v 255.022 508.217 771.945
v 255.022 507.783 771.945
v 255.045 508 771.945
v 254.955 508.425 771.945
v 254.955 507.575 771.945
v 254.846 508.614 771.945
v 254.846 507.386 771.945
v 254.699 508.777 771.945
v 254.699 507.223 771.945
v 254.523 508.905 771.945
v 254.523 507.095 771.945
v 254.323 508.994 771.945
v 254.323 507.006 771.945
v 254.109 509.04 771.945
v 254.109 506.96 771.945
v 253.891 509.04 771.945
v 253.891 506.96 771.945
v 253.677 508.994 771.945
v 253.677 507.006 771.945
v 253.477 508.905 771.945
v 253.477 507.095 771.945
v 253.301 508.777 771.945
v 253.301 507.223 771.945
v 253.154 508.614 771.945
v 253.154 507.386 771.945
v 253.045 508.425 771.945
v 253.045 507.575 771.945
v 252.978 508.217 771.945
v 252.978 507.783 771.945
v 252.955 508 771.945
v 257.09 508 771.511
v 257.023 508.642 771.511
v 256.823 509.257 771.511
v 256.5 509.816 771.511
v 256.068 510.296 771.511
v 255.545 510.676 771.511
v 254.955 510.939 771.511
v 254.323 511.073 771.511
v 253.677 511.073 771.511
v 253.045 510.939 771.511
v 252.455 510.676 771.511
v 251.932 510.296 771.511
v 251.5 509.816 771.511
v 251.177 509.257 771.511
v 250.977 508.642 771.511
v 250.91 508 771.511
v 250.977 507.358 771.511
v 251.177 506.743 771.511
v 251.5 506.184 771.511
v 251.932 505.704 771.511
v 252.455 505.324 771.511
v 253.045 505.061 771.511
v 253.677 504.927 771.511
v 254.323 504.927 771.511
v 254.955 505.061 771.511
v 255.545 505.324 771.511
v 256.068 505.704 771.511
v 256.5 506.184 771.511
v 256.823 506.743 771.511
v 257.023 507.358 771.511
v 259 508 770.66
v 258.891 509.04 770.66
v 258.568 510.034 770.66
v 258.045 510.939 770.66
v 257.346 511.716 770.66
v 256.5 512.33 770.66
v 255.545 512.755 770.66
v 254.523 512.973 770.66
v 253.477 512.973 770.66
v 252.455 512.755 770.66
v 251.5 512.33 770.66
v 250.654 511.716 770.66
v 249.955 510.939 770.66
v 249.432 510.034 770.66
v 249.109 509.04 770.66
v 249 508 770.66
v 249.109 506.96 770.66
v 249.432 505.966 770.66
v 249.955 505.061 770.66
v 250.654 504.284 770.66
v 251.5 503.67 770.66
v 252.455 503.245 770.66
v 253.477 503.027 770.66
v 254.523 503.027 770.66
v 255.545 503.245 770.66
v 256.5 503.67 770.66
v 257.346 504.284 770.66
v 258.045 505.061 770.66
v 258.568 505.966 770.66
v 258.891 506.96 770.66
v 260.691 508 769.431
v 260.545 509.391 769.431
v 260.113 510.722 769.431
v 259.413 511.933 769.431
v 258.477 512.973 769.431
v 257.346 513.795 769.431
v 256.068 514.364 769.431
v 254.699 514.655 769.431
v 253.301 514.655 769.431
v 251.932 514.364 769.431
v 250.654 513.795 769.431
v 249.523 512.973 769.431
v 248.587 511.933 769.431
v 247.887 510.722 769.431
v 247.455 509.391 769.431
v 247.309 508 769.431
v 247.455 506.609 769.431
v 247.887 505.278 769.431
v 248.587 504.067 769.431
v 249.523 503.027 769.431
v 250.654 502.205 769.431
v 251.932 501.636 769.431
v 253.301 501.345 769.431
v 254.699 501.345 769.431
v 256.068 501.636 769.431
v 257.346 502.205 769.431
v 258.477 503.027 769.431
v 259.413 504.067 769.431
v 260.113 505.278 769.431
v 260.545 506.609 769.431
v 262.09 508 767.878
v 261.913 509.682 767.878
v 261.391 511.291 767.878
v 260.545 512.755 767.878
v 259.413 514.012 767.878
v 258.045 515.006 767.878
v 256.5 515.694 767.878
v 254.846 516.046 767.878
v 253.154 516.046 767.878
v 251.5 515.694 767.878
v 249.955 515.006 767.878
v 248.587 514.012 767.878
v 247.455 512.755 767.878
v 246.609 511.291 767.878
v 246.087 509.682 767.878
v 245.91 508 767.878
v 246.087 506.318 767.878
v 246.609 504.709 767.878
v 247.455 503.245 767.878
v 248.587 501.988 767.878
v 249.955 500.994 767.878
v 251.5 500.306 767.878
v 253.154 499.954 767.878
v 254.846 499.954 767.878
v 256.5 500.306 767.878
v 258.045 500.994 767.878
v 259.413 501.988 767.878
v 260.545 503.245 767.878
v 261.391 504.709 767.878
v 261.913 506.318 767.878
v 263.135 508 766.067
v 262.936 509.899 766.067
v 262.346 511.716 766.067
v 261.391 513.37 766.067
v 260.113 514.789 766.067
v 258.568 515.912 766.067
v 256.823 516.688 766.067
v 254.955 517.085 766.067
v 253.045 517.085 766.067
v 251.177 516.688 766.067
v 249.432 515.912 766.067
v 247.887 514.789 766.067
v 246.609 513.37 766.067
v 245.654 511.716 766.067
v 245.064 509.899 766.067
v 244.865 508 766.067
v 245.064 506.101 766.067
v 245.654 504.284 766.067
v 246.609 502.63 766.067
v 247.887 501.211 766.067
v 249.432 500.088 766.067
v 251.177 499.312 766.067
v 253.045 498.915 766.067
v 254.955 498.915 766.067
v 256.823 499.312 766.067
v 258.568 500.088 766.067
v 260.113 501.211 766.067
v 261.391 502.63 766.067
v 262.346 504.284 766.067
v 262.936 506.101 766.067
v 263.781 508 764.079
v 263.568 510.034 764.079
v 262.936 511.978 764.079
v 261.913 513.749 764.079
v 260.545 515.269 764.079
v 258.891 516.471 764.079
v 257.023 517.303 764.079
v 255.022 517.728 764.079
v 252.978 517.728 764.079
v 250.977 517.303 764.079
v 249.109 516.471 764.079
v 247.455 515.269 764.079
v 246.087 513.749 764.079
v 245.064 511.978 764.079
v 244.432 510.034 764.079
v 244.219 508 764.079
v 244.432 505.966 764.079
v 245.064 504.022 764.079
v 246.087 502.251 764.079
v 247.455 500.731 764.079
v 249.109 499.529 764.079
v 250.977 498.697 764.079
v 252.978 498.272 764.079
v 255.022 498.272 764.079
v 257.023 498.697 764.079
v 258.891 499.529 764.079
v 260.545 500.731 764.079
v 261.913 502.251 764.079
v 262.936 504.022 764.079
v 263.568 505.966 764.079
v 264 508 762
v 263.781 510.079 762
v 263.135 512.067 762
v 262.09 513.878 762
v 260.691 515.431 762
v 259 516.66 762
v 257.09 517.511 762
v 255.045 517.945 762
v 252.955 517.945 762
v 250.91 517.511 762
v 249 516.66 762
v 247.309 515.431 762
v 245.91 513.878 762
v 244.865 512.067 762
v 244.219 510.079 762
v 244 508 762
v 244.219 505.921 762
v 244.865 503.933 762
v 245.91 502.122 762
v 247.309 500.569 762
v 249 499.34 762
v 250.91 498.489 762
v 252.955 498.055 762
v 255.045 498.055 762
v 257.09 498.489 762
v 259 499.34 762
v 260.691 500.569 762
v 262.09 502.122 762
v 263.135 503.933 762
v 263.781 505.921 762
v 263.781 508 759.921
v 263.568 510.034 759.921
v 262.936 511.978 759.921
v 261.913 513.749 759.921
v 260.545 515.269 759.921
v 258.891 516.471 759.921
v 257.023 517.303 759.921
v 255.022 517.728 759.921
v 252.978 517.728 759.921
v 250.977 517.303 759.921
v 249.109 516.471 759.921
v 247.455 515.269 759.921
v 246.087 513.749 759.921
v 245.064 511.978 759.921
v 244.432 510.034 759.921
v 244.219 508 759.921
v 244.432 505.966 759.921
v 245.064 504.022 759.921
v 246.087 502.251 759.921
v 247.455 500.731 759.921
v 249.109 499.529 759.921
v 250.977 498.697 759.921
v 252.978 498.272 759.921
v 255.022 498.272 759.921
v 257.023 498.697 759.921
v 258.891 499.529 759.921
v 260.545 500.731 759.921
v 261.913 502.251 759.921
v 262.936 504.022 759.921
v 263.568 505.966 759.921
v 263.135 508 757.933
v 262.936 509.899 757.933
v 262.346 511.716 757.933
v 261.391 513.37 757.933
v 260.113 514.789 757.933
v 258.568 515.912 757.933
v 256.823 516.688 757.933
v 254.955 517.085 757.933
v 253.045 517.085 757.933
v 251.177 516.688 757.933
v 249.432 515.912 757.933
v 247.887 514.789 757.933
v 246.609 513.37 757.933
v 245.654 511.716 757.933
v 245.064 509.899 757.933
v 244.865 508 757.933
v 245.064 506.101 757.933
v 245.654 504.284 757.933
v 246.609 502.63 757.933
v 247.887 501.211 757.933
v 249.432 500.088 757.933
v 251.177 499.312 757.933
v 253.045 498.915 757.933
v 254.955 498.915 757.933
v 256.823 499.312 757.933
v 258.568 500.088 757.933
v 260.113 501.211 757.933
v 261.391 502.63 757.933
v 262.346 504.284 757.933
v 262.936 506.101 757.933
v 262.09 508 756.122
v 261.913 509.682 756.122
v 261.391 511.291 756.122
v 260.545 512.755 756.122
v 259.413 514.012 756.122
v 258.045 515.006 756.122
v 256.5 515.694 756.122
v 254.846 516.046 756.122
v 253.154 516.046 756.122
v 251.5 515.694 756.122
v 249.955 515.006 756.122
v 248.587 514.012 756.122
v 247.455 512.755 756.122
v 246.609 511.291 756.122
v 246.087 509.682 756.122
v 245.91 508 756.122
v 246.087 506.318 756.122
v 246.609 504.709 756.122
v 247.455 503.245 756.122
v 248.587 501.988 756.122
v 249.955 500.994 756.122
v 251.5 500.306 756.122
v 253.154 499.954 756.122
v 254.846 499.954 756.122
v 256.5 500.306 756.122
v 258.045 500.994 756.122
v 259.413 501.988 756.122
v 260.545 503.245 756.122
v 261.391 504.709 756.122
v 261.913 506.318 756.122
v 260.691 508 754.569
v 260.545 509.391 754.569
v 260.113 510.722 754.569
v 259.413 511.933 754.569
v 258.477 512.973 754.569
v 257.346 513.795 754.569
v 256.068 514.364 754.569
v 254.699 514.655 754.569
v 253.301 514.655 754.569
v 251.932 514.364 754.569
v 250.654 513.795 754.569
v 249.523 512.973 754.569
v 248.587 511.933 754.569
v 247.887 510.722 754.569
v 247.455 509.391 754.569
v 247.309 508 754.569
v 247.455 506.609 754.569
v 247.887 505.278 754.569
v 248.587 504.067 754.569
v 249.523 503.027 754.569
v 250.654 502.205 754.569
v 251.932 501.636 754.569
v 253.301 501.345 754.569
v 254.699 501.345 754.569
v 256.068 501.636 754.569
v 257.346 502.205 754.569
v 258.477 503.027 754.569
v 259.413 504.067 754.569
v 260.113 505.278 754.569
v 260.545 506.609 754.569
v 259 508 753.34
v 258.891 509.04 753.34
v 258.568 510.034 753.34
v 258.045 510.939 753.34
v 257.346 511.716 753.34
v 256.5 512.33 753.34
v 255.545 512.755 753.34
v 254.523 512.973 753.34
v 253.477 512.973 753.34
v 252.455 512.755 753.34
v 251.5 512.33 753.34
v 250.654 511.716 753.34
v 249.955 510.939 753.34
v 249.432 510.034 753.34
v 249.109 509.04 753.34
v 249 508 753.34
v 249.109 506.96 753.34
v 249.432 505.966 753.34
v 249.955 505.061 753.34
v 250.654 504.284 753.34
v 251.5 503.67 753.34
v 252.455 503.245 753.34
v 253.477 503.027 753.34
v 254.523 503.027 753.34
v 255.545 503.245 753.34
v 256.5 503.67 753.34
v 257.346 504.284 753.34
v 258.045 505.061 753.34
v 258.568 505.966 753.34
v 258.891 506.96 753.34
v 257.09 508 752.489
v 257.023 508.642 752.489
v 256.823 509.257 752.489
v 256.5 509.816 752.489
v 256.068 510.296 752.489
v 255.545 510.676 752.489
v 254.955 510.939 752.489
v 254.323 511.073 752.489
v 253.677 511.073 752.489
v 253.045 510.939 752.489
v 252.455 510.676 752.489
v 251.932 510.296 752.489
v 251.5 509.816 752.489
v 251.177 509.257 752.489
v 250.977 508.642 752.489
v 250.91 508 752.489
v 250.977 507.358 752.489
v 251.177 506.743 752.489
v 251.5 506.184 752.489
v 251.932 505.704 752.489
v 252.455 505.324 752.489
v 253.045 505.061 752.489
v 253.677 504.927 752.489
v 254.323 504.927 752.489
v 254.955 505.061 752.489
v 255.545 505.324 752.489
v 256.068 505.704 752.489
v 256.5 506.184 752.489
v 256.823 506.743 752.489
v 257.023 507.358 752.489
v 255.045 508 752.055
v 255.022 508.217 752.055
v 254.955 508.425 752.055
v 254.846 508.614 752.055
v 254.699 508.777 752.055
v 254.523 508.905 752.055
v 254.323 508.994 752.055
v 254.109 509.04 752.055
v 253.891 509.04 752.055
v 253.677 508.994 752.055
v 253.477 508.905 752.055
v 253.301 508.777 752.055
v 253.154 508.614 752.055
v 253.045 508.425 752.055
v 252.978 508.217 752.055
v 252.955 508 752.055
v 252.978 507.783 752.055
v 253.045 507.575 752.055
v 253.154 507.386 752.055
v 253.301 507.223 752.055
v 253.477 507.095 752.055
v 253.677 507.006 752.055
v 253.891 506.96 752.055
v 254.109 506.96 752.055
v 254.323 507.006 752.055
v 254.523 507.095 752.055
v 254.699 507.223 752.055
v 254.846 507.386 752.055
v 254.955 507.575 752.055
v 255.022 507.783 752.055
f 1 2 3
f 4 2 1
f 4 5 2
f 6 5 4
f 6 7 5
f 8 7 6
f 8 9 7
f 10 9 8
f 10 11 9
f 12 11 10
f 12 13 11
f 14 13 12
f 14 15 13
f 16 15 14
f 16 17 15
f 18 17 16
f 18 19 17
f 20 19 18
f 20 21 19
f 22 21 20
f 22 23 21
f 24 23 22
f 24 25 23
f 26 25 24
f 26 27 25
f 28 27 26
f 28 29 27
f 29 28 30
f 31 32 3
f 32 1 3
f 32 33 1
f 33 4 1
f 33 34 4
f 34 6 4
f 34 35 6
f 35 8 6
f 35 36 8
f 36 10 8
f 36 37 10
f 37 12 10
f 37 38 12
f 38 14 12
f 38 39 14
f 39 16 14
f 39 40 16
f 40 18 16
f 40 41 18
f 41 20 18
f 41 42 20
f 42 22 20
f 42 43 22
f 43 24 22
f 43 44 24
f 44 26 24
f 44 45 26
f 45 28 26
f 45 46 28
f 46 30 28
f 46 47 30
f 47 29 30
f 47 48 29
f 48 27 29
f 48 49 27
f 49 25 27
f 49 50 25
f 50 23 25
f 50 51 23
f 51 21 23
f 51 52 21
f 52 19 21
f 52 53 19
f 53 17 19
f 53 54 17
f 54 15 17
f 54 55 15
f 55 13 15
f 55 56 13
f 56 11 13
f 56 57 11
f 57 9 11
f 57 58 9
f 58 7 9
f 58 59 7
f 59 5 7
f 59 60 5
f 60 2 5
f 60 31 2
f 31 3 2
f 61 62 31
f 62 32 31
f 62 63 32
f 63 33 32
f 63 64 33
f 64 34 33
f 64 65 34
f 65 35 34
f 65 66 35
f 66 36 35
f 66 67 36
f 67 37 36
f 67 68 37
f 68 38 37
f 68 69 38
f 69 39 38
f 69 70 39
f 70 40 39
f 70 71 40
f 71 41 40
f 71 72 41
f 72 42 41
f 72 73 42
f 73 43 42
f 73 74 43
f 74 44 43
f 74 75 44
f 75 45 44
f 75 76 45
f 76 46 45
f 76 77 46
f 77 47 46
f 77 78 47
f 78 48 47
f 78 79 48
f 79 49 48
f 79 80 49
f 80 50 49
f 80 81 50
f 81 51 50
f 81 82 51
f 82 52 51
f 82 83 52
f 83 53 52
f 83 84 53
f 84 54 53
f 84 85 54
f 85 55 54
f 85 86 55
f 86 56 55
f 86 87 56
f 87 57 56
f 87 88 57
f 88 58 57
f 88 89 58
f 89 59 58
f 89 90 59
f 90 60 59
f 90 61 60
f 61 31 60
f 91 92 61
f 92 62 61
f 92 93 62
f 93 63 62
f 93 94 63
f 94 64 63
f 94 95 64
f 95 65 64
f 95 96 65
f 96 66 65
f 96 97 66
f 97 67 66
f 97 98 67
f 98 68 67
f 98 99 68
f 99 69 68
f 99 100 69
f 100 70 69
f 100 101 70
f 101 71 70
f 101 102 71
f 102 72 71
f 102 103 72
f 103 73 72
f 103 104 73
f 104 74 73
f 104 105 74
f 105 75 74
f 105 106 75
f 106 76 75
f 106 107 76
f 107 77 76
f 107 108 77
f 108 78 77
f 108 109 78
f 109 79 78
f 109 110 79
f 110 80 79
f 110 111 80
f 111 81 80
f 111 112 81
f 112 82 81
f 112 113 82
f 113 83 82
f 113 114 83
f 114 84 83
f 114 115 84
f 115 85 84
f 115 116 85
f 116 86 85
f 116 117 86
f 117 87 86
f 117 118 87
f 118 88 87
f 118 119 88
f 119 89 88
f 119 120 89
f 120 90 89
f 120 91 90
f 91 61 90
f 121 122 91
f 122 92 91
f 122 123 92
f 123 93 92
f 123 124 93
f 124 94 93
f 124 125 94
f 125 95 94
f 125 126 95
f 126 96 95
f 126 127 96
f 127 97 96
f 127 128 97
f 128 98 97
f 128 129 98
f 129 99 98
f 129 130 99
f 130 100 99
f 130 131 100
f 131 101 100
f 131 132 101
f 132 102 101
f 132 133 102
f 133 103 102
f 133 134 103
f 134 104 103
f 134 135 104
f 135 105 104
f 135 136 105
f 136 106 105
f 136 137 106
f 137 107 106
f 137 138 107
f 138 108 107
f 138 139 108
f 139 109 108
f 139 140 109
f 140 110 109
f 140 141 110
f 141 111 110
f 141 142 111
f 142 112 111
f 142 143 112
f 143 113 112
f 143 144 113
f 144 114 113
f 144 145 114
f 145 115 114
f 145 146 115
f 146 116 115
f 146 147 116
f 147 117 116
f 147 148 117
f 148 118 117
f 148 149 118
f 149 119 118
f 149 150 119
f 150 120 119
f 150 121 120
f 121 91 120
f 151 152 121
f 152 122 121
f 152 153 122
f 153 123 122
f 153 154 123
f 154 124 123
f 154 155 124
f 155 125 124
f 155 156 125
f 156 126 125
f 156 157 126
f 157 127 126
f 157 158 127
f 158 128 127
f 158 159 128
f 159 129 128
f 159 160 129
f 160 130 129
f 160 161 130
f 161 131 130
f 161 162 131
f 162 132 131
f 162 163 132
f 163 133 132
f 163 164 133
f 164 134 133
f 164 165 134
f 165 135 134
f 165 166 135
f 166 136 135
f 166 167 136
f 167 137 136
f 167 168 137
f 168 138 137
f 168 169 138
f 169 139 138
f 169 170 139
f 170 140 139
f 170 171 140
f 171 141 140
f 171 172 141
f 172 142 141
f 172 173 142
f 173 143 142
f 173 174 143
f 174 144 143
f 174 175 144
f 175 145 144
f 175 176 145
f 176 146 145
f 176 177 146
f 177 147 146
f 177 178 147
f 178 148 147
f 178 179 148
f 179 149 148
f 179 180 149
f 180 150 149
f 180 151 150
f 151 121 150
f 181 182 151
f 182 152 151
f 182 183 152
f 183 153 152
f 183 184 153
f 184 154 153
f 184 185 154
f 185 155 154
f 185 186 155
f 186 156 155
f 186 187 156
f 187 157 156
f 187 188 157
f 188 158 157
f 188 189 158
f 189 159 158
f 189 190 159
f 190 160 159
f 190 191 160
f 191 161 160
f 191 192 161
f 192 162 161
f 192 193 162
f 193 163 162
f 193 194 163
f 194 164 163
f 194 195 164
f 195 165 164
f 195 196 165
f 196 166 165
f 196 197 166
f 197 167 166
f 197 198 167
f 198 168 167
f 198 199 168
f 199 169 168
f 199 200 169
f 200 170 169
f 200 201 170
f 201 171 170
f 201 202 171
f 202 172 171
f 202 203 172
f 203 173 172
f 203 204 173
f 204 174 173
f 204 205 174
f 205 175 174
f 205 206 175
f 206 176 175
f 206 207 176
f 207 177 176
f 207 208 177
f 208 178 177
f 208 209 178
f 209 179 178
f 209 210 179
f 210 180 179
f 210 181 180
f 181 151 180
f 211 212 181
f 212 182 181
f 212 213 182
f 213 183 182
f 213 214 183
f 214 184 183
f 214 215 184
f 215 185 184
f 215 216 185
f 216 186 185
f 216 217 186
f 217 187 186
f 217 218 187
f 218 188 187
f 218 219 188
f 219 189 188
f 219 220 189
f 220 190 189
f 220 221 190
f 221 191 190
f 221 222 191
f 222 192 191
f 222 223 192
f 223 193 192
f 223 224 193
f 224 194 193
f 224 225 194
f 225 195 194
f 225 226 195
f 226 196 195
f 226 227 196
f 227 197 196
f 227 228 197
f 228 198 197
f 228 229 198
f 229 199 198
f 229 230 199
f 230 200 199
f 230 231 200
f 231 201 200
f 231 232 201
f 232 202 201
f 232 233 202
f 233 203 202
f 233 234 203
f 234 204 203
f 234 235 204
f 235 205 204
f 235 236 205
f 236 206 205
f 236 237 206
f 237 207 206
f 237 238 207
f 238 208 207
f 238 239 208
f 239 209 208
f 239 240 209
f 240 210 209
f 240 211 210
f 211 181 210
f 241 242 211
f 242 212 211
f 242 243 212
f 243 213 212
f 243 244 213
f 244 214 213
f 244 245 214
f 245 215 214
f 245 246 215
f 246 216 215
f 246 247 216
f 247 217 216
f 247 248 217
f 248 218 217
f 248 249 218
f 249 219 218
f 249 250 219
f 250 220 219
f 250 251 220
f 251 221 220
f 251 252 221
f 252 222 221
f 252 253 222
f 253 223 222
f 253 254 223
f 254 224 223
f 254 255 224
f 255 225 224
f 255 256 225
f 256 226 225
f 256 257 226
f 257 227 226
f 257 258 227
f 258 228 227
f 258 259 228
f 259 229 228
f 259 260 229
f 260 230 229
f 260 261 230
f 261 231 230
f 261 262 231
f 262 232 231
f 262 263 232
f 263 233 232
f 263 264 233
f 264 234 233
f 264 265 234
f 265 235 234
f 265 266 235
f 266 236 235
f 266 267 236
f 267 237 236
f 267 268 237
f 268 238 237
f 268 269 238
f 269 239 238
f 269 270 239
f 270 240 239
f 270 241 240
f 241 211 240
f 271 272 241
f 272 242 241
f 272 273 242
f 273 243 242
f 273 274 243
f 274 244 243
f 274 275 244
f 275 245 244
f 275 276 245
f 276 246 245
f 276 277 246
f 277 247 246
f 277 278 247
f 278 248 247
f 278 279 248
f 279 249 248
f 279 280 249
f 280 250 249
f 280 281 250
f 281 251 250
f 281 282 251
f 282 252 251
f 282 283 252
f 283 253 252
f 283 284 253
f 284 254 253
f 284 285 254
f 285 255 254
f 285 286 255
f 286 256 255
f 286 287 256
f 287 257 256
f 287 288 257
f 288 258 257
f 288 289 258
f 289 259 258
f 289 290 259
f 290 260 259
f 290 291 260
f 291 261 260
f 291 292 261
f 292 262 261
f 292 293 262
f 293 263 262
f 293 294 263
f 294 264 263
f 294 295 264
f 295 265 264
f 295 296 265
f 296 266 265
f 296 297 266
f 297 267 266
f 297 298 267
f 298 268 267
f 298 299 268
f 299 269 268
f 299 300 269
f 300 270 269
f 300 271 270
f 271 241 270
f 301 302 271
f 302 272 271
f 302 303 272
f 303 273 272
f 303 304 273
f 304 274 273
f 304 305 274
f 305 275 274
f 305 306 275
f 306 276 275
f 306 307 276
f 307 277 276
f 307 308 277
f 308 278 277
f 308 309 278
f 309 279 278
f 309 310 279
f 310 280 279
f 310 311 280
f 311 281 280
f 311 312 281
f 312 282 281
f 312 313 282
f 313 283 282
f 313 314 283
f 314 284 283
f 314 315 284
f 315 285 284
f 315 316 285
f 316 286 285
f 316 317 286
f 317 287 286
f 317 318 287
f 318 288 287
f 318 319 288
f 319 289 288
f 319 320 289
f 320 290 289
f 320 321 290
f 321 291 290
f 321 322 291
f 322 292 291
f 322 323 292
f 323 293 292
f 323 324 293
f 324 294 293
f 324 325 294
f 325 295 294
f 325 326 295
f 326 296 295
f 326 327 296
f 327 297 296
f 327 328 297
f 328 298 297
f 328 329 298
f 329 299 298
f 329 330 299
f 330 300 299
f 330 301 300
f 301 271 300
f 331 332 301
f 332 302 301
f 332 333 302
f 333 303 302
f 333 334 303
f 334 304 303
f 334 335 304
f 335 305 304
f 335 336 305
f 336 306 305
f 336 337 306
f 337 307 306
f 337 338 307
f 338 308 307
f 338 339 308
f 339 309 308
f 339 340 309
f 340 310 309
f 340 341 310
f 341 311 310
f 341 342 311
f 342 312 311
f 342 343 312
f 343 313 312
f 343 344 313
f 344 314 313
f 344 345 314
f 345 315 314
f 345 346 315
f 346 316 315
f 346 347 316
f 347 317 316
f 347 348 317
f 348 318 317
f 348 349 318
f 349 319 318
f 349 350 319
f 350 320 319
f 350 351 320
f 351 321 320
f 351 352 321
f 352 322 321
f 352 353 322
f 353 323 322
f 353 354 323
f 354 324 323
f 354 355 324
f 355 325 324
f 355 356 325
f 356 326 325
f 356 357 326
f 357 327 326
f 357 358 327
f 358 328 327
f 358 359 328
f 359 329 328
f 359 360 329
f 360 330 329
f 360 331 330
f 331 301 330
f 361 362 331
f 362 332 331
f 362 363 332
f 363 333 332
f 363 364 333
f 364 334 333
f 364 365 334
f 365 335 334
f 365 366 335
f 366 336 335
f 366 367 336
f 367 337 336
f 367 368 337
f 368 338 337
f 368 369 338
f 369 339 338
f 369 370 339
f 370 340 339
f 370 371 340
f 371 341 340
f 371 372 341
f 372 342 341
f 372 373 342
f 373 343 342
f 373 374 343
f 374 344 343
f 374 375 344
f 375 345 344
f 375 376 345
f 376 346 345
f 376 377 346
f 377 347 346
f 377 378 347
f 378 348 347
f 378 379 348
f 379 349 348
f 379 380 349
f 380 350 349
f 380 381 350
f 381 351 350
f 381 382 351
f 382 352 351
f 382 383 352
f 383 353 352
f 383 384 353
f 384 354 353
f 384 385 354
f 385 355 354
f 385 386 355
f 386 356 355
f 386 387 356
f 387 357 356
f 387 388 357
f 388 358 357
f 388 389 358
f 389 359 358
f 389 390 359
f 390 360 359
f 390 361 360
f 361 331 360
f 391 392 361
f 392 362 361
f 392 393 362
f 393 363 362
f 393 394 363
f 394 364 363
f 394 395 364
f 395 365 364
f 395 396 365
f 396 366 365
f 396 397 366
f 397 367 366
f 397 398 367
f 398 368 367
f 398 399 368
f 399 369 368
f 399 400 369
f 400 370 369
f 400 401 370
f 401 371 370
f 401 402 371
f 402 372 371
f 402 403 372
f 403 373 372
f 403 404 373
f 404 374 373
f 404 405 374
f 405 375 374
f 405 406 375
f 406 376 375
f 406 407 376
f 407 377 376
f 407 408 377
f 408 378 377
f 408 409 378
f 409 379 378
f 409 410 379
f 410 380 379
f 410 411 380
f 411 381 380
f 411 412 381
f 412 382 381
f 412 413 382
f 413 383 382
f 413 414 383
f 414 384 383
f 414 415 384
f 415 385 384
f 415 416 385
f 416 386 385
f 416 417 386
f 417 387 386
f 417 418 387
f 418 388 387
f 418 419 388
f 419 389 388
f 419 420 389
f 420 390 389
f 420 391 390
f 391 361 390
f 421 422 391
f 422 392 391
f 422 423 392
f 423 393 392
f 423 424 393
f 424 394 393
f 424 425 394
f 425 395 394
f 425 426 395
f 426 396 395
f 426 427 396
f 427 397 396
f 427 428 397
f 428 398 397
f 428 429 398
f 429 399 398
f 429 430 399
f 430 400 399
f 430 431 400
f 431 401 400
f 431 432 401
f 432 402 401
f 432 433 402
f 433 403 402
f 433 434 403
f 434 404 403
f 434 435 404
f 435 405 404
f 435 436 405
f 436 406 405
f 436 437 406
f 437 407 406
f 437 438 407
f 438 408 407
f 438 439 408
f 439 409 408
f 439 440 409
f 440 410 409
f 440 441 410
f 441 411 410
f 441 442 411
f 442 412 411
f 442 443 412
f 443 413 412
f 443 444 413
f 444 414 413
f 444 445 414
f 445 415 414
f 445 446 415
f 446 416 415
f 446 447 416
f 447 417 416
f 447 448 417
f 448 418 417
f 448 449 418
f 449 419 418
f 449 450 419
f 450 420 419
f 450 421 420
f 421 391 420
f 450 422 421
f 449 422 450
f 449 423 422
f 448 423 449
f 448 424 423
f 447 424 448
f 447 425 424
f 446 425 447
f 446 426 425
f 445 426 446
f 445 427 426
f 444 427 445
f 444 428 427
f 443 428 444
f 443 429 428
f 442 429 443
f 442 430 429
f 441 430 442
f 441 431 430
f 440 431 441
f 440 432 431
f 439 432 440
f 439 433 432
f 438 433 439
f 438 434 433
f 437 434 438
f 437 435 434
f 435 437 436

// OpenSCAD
// Unit of length: Unit.MM
translate(v = [254.0, 508.0, 762.0])
{
   sphere(r = 10.0);
}
